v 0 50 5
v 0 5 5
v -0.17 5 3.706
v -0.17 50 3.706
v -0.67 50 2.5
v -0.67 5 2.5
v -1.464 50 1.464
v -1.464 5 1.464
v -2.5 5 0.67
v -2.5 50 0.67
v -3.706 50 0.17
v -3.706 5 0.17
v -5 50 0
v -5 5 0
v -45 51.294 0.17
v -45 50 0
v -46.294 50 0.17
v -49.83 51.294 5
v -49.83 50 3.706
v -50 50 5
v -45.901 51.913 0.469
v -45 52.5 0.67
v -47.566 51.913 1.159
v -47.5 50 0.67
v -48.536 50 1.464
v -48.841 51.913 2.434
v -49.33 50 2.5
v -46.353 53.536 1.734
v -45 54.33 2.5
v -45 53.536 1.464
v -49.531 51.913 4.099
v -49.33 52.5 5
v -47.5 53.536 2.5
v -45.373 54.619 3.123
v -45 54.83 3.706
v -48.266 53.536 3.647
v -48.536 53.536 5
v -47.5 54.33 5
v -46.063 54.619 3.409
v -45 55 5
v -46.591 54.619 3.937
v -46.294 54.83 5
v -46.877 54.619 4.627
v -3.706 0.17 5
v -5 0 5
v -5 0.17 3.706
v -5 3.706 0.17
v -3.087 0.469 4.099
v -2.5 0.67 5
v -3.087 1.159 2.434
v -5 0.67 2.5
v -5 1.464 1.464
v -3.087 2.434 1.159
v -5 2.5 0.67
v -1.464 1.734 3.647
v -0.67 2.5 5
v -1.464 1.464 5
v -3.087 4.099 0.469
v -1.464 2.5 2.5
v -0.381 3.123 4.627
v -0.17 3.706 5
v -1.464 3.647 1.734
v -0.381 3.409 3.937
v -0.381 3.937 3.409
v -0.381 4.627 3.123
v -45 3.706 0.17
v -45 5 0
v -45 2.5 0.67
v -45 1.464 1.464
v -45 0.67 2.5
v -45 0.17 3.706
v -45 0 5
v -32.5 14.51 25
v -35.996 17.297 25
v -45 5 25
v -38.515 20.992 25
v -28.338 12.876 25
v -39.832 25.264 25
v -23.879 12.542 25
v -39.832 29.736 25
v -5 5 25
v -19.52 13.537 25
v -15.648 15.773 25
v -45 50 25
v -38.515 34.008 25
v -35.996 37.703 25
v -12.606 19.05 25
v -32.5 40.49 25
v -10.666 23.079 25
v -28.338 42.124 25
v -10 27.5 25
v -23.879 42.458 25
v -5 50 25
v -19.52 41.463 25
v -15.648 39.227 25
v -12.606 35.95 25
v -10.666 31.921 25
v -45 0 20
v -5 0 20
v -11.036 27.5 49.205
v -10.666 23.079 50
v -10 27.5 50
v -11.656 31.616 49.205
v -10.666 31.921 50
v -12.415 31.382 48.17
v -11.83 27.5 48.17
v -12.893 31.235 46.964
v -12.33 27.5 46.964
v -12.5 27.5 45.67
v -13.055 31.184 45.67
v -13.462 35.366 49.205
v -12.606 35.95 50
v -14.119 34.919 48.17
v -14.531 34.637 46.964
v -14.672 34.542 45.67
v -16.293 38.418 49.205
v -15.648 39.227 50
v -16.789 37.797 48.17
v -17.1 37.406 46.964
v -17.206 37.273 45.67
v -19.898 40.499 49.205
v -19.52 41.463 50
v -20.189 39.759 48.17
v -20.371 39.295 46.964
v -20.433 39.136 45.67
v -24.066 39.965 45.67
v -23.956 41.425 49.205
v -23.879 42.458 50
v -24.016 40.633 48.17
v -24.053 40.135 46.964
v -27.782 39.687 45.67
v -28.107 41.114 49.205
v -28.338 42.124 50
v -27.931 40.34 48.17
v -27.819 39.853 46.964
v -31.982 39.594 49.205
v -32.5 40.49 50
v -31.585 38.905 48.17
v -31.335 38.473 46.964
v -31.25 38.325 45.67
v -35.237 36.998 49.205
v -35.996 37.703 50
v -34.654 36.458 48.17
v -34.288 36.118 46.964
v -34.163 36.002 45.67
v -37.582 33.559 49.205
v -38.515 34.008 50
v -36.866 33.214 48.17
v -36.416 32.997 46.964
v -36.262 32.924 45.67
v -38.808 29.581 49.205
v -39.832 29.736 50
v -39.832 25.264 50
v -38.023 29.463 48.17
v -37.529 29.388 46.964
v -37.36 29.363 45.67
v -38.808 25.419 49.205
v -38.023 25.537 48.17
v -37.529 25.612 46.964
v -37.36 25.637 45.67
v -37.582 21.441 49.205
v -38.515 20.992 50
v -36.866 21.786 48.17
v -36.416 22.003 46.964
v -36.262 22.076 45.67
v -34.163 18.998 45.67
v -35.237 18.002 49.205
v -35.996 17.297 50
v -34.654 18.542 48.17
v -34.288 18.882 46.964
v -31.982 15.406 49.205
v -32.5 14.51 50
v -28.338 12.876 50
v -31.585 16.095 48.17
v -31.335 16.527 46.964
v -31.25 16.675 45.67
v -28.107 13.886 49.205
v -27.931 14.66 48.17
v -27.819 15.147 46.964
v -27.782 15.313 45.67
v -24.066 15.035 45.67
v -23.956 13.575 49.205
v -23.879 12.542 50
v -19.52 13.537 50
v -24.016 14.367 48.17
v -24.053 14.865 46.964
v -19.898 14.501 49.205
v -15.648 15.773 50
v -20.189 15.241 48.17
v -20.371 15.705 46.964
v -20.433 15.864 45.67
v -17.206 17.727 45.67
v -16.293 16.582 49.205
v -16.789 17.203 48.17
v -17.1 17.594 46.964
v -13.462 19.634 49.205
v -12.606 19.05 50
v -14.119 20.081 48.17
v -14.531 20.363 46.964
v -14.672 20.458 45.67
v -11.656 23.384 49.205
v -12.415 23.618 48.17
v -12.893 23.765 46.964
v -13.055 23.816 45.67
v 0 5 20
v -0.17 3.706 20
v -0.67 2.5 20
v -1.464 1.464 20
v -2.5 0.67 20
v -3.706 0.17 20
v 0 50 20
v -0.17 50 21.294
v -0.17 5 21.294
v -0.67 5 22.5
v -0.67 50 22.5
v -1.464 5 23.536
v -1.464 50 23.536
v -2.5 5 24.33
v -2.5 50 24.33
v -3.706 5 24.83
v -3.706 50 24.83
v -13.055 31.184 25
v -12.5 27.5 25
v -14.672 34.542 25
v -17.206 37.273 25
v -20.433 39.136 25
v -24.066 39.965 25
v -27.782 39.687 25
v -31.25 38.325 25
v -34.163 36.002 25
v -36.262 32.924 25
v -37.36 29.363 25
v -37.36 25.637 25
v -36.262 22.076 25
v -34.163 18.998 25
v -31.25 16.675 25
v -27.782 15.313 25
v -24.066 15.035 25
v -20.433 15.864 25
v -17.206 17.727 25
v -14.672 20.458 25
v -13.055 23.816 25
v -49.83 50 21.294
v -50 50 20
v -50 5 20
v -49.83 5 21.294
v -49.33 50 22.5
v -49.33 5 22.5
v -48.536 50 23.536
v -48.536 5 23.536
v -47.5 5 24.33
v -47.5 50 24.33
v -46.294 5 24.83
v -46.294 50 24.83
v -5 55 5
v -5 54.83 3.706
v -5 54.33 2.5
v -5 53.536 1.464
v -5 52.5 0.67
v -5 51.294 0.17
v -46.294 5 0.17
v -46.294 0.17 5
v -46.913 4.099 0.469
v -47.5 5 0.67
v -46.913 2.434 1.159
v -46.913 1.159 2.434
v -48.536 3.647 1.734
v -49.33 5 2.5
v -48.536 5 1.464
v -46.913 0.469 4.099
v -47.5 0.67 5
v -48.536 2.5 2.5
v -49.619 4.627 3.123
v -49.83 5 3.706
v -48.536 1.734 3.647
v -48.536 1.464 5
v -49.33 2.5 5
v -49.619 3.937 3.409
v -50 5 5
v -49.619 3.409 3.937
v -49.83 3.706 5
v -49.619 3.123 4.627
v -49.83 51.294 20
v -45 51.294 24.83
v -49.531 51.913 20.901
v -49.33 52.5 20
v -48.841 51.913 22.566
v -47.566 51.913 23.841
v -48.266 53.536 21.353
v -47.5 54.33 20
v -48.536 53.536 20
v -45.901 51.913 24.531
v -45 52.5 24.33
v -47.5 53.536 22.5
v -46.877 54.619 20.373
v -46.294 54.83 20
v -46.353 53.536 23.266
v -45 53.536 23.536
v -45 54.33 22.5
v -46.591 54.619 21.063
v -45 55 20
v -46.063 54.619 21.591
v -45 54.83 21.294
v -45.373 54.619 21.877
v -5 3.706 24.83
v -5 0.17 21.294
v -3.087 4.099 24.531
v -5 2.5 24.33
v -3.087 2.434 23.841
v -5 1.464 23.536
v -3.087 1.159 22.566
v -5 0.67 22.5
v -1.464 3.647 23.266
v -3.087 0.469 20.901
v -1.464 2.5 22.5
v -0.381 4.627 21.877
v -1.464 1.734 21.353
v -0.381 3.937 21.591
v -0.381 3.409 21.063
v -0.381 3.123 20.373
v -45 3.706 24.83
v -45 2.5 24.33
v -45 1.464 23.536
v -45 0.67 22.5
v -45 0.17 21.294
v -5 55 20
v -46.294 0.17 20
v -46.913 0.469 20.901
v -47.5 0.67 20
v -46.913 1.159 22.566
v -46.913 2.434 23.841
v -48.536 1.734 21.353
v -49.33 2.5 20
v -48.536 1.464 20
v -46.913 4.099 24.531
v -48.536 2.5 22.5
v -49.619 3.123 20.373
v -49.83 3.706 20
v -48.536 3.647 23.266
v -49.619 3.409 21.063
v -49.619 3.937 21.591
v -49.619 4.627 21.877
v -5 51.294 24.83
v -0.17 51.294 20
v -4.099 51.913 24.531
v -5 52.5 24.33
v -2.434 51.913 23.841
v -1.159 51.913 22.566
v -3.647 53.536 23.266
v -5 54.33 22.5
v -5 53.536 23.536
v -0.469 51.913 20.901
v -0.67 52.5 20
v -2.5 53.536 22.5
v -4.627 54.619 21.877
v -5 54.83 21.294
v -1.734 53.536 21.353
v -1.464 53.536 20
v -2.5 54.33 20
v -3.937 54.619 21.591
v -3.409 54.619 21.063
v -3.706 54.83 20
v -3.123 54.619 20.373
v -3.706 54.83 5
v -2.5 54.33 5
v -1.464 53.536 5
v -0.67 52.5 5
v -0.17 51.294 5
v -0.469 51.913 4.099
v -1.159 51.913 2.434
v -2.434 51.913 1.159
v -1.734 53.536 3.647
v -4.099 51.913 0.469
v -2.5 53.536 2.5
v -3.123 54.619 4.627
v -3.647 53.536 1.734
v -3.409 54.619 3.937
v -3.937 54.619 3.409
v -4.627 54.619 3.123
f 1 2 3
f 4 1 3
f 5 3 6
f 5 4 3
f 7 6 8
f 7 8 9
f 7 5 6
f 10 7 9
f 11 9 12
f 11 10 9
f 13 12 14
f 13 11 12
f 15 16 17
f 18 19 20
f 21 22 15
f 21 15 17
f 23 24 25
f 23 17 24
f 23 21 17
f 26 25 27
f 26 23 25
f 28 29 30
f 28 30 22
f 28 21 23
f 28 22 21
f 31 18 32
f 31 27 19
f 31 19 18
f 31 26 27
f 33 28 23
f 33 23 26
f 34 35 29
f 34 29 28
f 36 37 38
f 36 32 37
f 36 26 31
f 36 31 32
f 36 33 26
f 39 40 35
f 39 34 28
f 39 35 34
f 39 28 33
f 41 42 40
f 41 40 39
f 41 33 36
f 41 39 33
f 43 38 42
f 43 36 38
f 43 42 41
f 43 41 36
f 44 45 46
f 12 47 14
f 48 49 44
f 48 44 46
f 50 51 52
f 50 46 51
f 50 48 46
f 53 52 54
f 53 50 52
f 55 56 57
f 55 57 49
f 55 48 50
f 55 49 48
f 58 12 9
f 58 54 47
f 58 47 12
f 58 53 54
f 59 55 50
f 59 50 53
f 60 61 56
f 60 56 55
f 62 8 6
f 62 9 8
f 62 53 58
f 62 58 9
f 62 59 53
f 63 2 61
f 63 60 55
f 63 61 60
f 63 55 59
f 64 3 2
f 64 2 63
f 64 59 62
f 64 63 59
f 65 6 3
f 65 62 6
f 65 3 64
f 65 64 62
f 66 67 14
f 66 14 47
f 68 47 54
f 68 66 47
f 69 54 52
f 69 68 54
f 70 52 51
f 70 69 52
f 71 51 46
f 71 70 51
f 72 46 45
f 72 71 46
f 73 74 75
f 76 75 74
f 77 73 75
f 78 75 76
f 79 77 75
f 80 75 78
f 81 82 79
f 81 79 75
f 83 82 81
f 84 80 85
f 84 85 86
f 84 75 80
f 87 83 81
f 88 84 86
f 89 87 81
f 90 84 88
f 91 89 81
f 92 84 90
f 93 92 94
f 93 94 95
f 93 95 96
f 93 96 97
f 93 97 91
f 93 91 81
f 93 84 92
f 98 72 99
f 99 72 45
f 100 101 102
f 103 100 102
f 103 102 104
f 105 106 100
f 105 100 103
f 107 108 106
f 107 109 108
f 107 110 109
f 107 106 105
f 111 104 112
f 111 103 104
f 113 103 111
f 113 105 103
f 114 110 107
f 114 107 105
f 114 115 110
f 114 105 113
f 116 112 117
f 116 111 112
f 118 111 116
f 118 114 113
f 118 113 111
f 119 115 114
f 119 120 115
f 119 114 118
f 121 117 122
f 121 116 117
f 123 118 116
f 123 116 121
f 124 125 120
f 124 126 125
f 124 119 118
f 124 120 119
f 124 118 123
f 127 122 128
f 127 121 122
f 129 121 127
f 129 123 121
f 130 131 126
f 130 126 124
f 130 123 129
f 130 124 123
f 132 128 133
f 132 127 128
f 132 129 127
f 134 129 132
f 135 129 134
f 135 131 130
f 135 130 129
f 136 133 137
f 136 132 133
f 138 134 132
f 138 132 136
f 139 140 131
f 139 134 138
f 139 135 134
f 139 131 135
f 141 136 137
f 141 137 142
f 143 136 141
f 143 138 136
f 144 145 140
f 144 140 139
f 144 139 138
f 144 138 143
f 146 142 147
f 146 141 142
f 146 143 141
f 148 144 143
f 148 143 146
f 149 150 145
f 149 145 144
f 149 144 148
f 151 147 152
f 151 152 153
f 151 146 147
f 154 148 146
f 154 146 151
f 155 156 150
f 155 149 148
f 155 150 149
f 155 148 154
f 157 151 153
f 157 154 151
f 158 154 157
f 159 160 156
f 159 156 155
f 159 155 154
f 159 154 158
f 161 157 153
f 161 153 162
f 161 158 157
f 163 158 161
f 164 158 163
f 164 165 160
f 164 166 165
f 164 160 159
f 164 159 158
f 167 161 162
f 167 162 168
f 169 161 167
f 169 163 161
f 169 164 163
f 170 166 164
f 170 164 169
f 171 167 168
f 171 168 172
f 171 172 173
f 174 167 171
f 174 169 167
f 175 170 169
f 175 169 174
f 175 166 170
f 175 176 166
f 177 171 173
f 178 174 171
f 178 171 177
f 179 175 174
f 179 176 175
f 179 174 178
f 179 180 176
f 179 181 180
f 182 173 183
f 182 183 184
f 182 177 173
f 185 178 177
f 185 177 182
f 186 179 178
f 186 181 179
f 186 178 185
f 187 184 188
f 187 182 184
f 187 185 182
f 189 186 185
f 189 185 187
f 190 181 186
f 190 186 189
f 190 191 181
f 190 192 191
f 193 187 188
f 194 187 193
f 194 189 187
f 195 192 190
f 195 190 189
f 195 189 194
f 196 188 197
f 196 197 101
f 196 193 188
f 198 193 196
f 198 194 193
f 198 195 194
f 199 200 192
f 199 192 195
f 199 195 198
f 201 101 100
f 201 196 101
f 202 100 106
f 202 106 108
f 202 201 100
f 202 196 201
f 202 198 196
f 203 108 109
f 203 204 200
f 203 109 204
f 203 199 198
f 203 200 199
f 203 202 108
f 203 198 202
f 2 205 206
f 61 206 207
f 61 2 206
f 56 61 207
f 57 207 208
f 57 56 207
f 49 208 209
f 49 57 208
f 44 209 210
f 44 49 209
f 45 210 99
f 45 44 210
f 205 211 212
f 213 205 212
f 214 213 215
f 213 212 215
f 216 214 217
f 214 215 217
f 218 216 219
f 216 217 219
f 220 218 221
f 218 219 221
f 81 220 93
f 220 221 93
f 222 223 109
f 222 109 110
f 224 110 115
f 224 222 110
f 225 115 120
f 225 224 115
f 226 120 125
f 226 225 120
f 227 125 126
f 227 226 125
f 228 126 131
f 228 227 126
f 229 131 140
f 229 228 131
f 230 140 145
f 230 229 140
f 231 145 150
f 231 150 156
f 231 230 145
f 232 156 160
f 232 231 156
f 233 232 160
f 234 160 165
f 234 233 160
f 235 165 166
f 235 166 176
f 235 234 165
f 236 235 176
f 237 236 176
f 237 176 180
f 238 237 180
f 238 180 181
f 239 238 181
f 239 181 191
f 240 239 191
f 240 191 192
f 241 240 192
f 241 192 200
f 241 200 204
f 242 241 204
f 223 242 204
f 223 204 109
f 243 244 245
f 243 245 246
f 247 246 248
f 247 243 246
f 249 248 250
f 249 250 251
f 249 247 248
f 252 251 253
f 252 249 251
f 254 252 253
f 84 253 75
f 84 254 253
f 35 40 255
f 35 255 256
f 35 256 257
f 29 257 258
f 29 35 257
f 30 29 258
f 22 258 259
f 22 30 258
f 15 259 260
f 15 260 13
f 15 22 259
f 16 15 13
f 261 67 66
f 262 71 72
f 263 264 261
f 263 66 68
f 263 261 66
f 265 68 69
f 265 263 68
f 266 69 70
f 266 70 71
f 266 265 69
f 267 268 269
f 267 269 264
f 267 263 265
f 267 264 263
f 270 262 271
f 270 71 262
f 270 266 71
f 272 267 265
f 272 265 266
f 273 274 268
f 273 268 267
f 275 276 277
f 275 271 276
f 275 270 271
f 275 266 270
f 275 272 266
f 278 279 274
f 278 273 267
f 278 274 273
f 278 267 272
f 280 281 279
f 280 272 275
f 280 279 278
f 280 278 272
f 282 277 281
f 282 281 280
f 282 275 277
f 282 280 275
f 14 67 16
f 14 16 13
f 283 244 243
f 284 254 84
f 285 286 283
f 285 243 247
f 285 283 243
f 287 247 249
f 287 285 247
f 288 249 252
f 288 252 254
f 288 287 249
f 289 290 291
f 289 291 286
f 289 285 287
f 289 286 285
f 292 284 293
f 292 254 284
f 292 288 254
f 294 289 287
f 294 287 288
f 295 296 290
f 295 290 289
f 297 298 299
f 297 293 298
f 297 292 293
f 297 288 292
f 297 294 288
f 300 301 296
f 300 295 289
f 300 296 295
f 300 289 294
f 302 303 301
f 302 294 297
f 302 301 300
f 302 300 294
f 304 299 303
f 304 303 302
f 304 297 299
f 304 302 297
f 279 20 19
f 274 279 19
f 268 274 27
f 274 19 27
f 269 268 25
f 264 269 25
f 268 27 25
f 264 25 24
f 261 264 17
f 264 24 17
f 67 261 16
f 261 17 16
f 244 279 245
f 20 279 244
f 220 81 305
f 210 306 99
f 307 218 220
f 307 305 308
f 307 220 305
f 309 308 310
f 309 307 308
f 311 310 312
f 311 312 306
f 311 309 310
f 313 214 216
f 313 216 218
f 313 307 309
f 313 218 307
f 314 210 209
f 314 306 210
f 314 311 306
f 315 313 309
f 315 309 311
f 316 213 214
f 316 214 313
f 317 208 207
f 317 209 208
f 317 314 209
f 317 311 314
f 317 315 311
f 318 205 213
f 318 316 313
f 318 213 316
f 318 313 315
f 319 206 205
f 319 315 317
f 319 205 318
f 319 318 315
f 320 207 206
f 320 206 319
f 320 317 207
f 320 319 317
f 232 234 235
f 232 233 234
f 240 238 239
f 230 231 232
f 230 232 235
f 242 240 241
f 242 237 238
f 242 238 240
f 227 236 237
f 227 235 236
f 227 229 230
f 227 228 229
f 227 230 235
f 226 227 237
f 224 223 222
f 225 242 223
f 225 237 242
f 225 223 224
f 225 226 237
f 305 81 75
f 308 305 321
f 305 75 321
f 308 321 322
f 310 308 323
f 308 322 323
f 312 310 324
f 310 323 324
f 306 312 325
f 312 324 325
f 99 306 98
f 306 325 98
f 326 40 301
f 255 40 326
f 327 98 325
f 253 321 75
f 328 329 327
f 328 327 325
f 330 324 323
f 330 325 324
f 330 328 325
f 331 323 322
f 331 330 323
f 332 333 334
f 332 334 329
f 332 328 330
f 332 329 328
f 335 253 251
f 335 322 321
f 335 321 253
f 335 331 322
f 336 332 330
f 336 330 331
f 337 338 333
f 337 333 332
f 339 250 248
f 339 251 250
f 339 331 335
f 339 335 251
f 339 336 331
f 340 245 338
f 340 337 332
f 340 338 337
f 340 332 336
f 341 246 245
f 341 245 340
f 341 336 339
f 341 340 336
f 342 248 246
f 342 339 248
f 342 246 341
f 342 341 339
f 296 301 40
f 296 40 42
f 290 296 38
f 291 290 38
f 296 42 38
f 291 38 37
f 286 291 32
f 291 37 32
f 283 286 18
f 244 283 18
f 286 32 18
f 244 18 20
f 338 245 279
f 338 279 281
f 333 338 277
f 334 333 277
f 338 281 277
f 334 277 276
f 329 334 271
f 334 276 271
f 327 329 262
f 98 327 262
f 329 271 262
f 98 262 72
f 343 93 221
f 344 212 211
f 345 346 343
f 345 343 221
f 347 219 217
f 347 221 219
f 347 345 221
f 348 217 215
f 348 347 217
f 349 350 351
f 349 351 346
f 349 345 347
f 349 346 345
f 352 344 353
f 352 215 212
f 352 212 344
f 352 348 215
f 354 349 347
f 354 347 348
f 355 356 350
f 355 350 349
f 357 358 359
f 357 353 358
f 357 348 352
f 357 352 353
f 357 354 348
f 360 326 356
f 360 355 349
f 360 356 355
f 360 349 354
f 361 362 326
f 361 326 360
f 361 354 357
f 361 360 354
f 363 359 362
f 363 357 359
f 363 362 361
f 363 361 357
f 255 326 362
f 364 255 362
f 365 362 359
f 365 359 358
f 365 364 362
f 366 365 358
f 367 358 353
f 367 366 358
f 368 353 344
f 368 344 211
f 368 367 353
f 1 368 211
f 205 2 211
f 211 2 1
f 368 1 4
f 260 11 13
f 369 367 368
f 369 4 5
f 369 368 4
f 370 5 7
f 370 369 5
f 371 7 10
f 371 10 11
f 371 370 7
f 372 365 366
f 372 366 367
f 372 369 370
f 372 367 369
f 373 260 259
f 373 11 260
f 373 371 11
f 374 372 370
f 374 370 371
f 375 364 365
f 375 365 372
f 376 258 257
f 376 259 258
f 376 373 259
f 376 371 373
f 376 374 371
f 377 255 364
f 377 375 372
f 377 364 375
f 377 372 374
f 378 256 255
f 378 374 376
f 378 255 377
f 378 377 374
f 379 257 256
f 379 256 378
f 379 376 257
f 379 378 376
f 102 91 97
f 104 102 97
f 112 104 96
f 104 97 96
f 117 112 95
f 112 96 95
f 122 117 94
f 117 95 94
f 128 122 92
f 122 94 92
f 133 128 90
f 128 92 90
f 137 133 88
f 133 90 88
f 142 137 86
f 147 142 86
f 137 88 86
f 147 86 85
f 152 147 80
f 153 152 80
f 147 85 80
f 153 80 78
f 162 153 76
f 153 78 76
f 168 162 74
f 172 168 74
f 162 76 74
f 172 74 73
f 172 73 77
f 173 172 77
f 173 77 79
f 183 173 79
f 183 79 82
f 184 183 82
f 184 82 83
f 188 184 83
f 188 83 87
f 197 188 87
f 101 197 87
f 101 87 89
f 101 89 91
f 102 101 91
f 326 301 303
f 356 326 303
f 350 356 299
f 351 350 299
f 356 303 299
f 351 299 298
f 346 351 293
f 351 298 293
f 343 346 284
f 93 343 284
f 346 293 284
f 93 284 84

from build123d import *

# Parameters (mm, degrees)
F0_W         = 50
F0_H         = 55
F0_R         = 15
F0_R_2       = 12.5
F1_DEPTH     = 25
F2_DEPTH     = 50
F3_T1_DEPTH  = 40
F3_T3_DEPTH  = 45
F3_T5_DEPTH  = 15
F3_S9_W      = 5.1
F3_S9_H      = 5.1
F3_T10_DEPTH = 5.1
F3_S15_W     = 5.1
F3_S15_H     = 5.1
F3_T16_DEPTH = 5.1
F3_S21_W     = 5.1
F3_S21_H     = 5.1
F3_T22_DEPTH = 5.1
F3_S27_W     = 5.1
F3_S27_H     = 5.1
F3_T28_DEPTH = 5.1
F3_S33_W     = 5.1
F3_S33_H     = 5.1
F3_T34_DEPTH = 5.1
F3_S39_W     = 5.1
F3_S39_H     = 5.1
F3_T40_DEPTH = 5.1
F3_S45_W     = 5.1
F3_S45_H     = 5.1
F3_T46_DEPTH = 5.1
F3_S51_W     = 5.1
F3_S51_H     = 5.1
F3_T52_DEPTH = 5.1


# Not quite as in the source:
# - a fillet or chamfer that OpenCascade refuses, or shapes differently, is made with other operations: its cross-section is extruded or revolved along the edge and cut away or added


with BuildPart() as f1:
    # F0 (on Top) → F1 (new body)
    with BuildSketch(Plane.XY):
        with Locations((-25, 27.5)):
            Rectangle(F0_W, F0_H)
        with Locations((-25, 27.5)):
            Circle(F0_R, mode=Mode.SUBTRACT)
        with Locations((-25, 27.5)):
            Circle(F0_R)
        with Locations((-25, 27.5)):
            Circle(F0_R_2, mode=Mode.SUBTRACT)
        with Locations((-25, 27.5)):
            Circle(F0_R_2)
    extrude(amount=F1_DEPTH)

    # F0 (on Top) → F2 (join)
    with BuildSketch(Plane.XY):
        with Locations((-25, 27.5)):
            Circle(F0_R)
        with Locations((-25, 27.5)):
            Circle(F0_R_2, mode=Mode.SUBTRACT)
    extrude(amount=F2_DEPTH)

    # F3: fillet of radius 5 on 13 edges, made by hand

    # F3_s2 → F3_t1 (cut)
    with BuildSketch(Plane.YZ.offset(-45)):
        with BuildLine():
            ThreePointArc((55, 20), (53.5355339059, 23.5355339059), (50, 25))
            Line((50, 25), (55, 25))
            Line((55, 25), (55, 20))
        make_face()
        with BuildLine():
            ThreePointArc((5, 0), (1.4644660941, 1.4644660941), (0, 5))
            Line((0, 5), (0, 0))
            Line((0, 0), (5, 0))
        make_face()
        with BuildLine():
            ThreePointArc((5, 25), (1.4644660941, 23.5355339059), (0, 20))
            Line((0, 20), (0, 25))
            Line((0, 25), (5, 25))
        make_face()
        with BuildLine():
            ThreePointArc((55, 5), (53.5355339059, 1.4644660941), (50, 0))
            Line((50, 0), (55, 0))
            Line((55, 0), (55, 5))
        make_face()
    extrude(amount=F3_T1_DEPTH, mode=Mode.SUBTRACT)

    # F3_s4 → F3_t3 (cut)
    with BuildSketch(Plane.XZ.offset(-50)):
        with BuildLine():
            ThreePointArc((-50, 20), (-48.5355339059, 23.5355339059), (-45, 25))
            Line((-45, 25), (-50, 25))
            Line((-50, 25), (-50, 20))
        make_face()
        with BuildLine():
            ThreePointArc((0, 5), (-1.4644660941, 1.4644660941), (-5, 0))
            Line((-5, 0), (0, 0))
            Line((0, 0), (0, 5))
        make_face()
        with BuildLine():
            ThreePointArc((0, 20), (-1.4644660941, 23.5355339059), (-5, 25))
            Line((-5, 25), (0, 25))
            Line((0, 25), (0, 20))
        make_face()
        with BuildLine():
            ThreePointArc((-50, 5), (-48.5355339059, 1.4644660941), (-45, 0))
            Line((-45, 0), (-50, 0))
            Line((-50, 0), (-50, 5))
        make_face()
    extrude(amount=F3_T3_DEPTH, mode=Mode.SUBTRACT)

    # F3_s6 → F3_t5 (cut)
    with BuildSketch(Plane.XY.offset(5)):
        with BuildLine():
            ThreePointArc((-50, 5), (-48.5355339059, 1.4644660941), (-45, 0))
            Line((-45, 0), (-50, 0))
            Line((-50, 0), (-50, 5))
        make_face()
        with BuildLine():
            ThreePointArc((0, 5), (-1.4644660941, 1.4644660941), (-5, 0))
            Line((-5, 0), (0, 0))
            Line((0, 0), (0, 5))
        make_face()
        with BuildLine():
            ThreePointArc((-5, 55), (-1.4644660941, 53.5355339059), (0, 50))
            Line((0, 50), (0, 55))
            Line((0, 55), (-5, 55))
        make_face()
        with BuildLine():
            ThreePointArc((-45, 55), (-48.5355339059, 53.5355339059), (-50, 50))
            Line((-50, 50), (-50, 55))
            Line((-50, 55), (-45, 55))
        make_face()
    extrude(amount=F3_T5_DEPTH, mode=Mode.SUBTRACT)


with BuildPart() as f3_tool8:
    # F3_s9 → F3_t10 (new body)
    with BuildSketch(Plane.XZ.offset(-50)):
        with Locations((-2.45, 22.55)):
            Rectangle(F3_S9_W, F3_S9_H)
    extrude(amount=-F3_T10_DEPTH)

    # F3_s11 → F3_t12 (revolve, cut)
    with BuildSketch(Plane(origin=(-5, 50, 20), x_dir=(-0.7071067812, 0, -0.7071067812), z_dir=(0.7071067812, 0, -0.7071067812))):
        with BuildLine():
            ThreePointArc((0, -5), (5, 0), (0, 5))
            Line((0, 5), (0, -5))
        make_face()
    revolve(axis=Axis((-5, 50, 20), (0, 1, 0)), mode=Mode.SUBTRACT)


with BuildPart() as f1_1:
    add(f1.part)

    # F3_t7: cut F3_tool8
    add(f3_tool8.part, mode=Mode.SUBTRACT)


with BuildPart() as f3_tool14:
    # F3_s15 → F3_t16 (new body)
    with BuildSketch(Plane.XZ.offset(-50)):
        with Locations((-47.55, 22.55)):
            Rectangle(F3_S15_W, F3_S15_H)
    extrude(amount=-F3_T16_DEPTH)

    # F3_s17 → F3_t18 (revolve, cut)
    with BuildSketch(Plane(origin=(-45, 50, 20), x_dir=(0.7071067812, 0, -0.7071067812), z_dir=(0.7071067812, 0, 0.7071067812))):
        with BuildLine():
            ThreePointArc((0, -5), (5, 0), (0, 5))
            Line((0, 5), (0, -5))
        make_face()
    revolve(axis=Axis((-45, 50, 20), (0, 1, 0)), mode=Mode.SUBTRACT)


with BuildPart() as f1_2:
    add(f1_1.part)

    # F3_t13: cut F3_tool14
    add(f3_tool14.part, mode=Mode.SUBTRACT)


with BuildPart() as f3_tool20:
    # F3_s21 → F3_t22 (new body)
    with BuildSketch(Plane.YZ.offset(-45)):
        with Locations((2.45, 22.55)):
            Rectangle(F3_S21_W, F3_S21_H)
    extrude(amount=-F3_T22_DEPTH)

    # F3_s23 → F3_t24 (revolve, cut)
    with BuildSketch(Plane(origin=(-45, 5, 20), x_dir=(0, 0.7071067812, -0.7071067812), z_dir=(0, 0.7071067812, 0.7071067812))):
        with BuildLine():
            ThreePointArc((0, -5), (5, 0), (0, 5))
            Line((0, 5), (0, -5))
        make_face()
    revolve(axis=Axis((-45, 5, 20), (-1, 0, 0)), mode=Mode.SUBTRACT)


with BuildPart() as f1_3:
    add(f1_2.part)

    # F3_t19: cut F3_tool20
    add(f3_tool20.part, mode=Mode.SUBTRACT)


with BuildPart() as f3_tool26:
    # F3_s27 → F3_t28 (new body)
    with BuildSketch(Plane.YZ.offset(-45)):
        with Locations((2.45, 2.45)):
            Rectangle(F3_S27_W, F3_S27_H)
    extrude(amount=-F3_T28_DEPTH)

    # F3_s29 → F3_t30 (revolve, cut)
    with BuildSketch(Plane(origin=(-45, 5, 5), x_dir=(0, 0.7071067812, 0.7071067812), z_dir=(0, -0.7071067812, 0.7071067812))):
        with BuildLine():
            ThreePointArc((0, -5), (5, 0), (0, 5))
            Line((0, 5), (0, -5))
        make_face()
    revolve(axis=Axis((-45, 5, 5), (-1, 0, 0)), mode=Mode.SUBTRACT)


with BuildPart() as f1_4:
    add(f1_3.part)

    # F3_t25: cut F3_tool26
    add(f3_tool26.part, mode=Mode.SUBTRACT)


with BuildPart() as f3_tool32:
    # F3_s33 → F3_t34 (new body)
    with BuildSketch(Plane.YZ.offset(-5)):
        with Locations((2.45, 2.45)):
            Rectangle(F3_S33_W, F3_S33_H)
    extrude(amount=F3_T34_DEPTH)

    # F3_s35 → F3_t36 (revolve, cut)
    with BuildSketch(Plane(origin=(-5, 5, 5), x_dir=(0, 0.7071067812, 0.7071067812), z_dir=(0, 0.7071067812, -0.7071067812))):
        with BuildLine():
            ThreePointArc((0, -5), (5, 0), (0, 5))
            Line((0, 5), (0, -5))
        make_face()
    revolve(axis=Axis((-5, 5, 5), (1, 0, 0)), mode=Mode.SUBTRACT)


with BuildPart() as f1_5:
    add(f1_4.part)

    # F3_t31: cut F3_tool32
    add(f3_tool32.part, mode=Mode.SUBTRACT)


with BuildPart() as f3_tool38:
    # F3_s39 → F3_t40 (new body)
    with BuildSketch(Plane.YZ.offset(-5)):
        with Locations((2.45, 22.55)):
            Rectangle(F3_S39_W, F3_S39_H)
    extrude(amount=F3_T40_DEPTH)

    # F3_s41 → F3_t42 (revolve, cut)
    with BuildSketch(Plane(origin=(-5, 5, 20), x_dir=(0, 0.7071067812, -0.7071067812), z_dir=(0, -0.7071067812, -0.7071067812))):
        with BuildLine():
            ThreePointArc((0, -5), (5, 0), (0, 5))
            Line((0, 5), (0, -5))
        make_face()
    revolve(axis=Axis((-5, 5, 20), (1, 0, 0)), mode=Mode.SUBTRACT)


with BuildPart() as f1_6:
    add(f1_5.part)

    # F3_t37: cut F3_tool38
    add(f3_tool38.part, mode=Mode.SUBTRACT)


with BuildPart() as f3_tool44:
    # F3_s45 → F3_t46 (new body)
    with BuildSketch(Plane.XZ.offset(-50)):
        with Locations((-2.45, 2.45)):
            Rectangle(F3_S45_W, F3_S45_H)
    extrude(amount=-F3_T46_DEPTH)

    # F3_s47 → F3_t48 (revolve, cut)
    with BuildSketch(Plane(origin=(-5, 50, 5), x_dir=(-0.7071067812, 0, 0.7071067812), z_dir=(-0.7071067812, 0, -0.7071067812))):
        with BuildLine():
            ThreePointArc((0, -5), (5, 0), (0, 5))
            Line((0, 5), (0, -5))
        make_face()
    revolve(axis=Axis((-5, 50, 5), (0, 1, 0)), mode=Mode.SUBTRACT)


with BuildPart() as f1_7:
    add(f1_6.part)

    # F3_t43: cut F3_tool44
    add(f3_tool44.part, mode=Mode.SUBTRACT)


with BuildPart() as f3_tool50:
    # F3_s51 → F3_t52 (new body)
    with BuildSketch(Plane.XZ.offset(-50)):
        with Locations((-47.55, 2.45)):
            Rectangle(F3_S51_W, F3_S51_H)
    extrude(amount=-F3_T52_DEPTH)

    # F3_s53 → F3_t54 (revolve, cut)
    with BuildSketch(Plane(origin=(-45, 50, 5), x_dir=(0.7071067812, 0, 0.7071067812), z_dir=(-0.7071067812, 0, 0.7071067812))):
        with BuildLine():
            ThreePointArc((0, -5), (5, 0), (0, 5))
            Line((0, 5), (0, -5))
        make_face()
    revolve(axis=Axis((-45, 50, 5), (0, 1, 0)), mode=Mode.SUBTRACT)


with BuildPart() as f1_8:
    add(f1_7.part)

    # F3_t49: cut F3_tool50
    add(f3_tool50.part, mode=Mode.SUBTRACT)

    # F3_s55 → F3_t56 (revolve, cut)
    with BuildSketch(Plane.XZ.offset(-27.5)):
        with BuildLine():
            ThreePointArc((-10, 50), (-11.8301270189, 48.1698729811), (-12.5, 45.6698729811))
            Line((-12.5, 45.6698729811), (-12.5, 50))
            Line((-12.5, 50), (-10, 50))
        make_face()
    revolve(axis=Axis((-25, 27.5, 50), (0, 0, 1)), mode=Mode.SUBTRACT)


solid = f1_8.part
